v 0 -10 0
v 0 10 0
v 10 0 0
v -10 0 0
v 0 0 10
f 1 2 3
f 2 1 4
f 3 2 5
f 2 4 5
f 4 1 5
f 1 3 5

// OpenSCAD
echo(version=version());

polyhedron(
  points = [
    [10, 0, 0],
    [0, 10, 0],
    [-10, 0, 0],
    [0, -10, 0],
    [0, 0, 10]
  ],
  triangles = [
    [0, 1, 2, 3],
    [4, 1, 0],
    [4, 2, 1],
    [4, 3, 2],
    [4, 0, 3]
  ]
);

// Written by Clifford Wolf <clifford@clifford.at> and Marius
// Kintel <marius@kintel.net>
//
// To the extent possible under law, the author(s) have dedicated all
// copyright and related and neighboring rights to this software to the
// public domain worldwide. This software is distributed without any
// warranty.
//
// You should have received a copy of the CC0 Public Domain
// Dedication along with this software.
// If not, see <http://creativecommons.org/publicdomain/zero/1.0/>.
